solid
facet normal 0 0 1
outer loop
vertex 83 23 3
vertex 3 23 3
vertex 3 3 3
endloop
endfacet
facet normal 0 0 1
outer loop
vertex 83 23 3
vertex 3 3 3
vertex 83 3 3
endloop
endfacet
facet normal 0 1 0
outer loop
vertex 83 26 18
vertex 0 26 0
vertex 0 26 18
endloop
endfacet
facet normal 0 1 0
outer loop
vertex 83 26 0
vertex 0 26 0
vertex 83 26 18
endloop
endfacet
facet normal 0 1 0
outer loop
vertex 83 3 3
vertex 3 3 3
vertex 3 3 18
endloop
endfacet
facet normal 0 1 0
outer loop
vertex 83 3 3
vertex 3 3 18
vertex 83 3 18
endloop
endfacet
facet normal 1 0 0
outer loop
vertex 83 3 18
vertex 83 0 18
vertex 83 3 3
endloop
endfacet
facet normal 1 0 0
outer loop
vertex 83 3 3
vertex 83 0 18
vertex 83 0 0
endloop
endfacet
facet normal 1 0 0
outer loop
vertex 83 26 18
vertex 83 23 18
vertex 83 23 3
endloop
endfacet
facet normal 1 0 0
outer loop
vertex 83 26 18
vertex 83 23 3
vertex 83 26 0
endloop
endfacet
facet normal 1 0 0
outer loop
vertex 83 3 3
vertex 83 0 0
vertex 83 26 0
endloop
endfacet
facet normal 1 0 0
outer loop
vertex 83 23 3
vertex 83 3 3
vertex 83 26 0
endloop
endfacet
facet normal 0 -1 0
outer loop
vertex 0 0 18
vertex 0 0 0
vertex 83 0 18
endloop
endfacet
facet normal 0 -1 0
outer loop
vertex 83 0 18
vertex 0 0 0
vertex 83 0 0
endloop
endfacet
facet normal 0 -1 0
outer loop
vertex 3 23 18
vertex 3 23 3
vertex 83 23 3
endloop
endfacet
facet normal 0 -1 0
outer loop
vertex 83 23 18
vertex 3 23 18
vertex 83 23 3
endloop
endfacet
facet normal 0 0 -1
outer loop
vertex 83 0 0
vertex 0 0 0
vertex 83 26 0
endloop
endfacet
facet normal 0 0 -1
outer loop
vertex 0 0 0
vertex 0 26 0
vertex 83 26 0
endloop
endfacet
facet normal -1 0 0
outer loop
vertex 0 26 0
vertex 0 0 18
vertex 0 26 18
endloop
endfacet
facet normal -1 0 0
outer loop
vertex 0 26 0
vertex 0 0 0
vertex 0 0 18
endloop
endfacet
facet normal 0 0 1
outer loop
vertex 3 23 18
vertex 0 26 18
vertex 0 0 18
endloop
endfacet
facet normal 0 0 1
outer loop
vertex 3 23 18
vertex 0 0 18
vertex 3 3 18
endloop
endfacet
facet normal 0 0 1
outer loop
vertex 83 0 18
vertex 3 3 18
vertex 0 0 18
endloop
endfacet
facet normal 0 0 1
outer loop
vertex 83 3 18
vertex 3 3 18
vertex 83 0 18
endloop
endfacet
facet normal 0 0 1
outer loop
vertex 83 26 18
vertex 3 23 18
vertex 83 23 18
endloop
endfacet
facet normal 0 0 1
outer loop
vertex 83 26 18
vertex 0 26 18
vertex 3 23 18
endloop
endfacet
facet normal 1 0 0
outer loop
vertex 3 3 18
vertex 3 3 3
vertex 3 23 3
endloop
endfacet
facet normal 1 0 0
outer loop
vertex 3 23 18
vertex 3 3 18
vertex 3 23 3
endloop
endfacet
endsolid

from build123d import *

# Parameters (mm, degrees)
BOX003_W     = 3
BOX003_H     = 26
BOX003_DEPTH = 18
BOX_W        = 83
BOX_H        = 26
BOX_DEPTH    = 3
BOX001_W     = 83
BOX001_H     = 3
BOX001_DEPTH = 18
BOX002_W     = 83
BOX002_H     = 3
BOX002_DEPTH = 18


with BuildPart() as paredefundo:
    # Box003 → Box003 (new body)
    with BuildSketch(Plane.XY):
        with Locations((1.5, 13)):
            Rectangle(BOX003_W, BOX003_H)
    extrude(amount=BOX003_DEPTH)


with BuildPart() as baseinferior:
    # Box → Box (new body)
    with BuildSketch(Plane.XY):
        with Locations((41.5, 13)):
            Rectangle(BOX_W, BOX_H)
    extrude(amount=BOX_DEPTH)


with BuildPart() as paredeesquerda:
    # Box001 → Box001 (new body)
    with BuildSketch(Plane.XY):
        with Locations((41.5, 1.5)):
            Rectangle(BOX001_W, BOX001_H)
    extrude(amount=BOX001_DEPTH)


with BuildPart() as pe_a_unida_sem_refinar:
    # Box002 → Box002 (new body)
    with BuildSketch(Plane(origin=(0, 23, 0), x_dir=(1, 0, 0), z_dir=(0, 0, 1))):
        with Locations((41.5, 1.5)):
            Rectangle(BOX002_W, BOX002_H)
    extrude(amount=BOX002_DEPTH)

    # Fusion: union ParedeFundo, BaseInferior, ParedeEsquerda
    add(paredefundo.part)
    add(baseinferior.part)
    add(paredeesquerda.part)


solid = pe_a_unida_sem_refinar.part
